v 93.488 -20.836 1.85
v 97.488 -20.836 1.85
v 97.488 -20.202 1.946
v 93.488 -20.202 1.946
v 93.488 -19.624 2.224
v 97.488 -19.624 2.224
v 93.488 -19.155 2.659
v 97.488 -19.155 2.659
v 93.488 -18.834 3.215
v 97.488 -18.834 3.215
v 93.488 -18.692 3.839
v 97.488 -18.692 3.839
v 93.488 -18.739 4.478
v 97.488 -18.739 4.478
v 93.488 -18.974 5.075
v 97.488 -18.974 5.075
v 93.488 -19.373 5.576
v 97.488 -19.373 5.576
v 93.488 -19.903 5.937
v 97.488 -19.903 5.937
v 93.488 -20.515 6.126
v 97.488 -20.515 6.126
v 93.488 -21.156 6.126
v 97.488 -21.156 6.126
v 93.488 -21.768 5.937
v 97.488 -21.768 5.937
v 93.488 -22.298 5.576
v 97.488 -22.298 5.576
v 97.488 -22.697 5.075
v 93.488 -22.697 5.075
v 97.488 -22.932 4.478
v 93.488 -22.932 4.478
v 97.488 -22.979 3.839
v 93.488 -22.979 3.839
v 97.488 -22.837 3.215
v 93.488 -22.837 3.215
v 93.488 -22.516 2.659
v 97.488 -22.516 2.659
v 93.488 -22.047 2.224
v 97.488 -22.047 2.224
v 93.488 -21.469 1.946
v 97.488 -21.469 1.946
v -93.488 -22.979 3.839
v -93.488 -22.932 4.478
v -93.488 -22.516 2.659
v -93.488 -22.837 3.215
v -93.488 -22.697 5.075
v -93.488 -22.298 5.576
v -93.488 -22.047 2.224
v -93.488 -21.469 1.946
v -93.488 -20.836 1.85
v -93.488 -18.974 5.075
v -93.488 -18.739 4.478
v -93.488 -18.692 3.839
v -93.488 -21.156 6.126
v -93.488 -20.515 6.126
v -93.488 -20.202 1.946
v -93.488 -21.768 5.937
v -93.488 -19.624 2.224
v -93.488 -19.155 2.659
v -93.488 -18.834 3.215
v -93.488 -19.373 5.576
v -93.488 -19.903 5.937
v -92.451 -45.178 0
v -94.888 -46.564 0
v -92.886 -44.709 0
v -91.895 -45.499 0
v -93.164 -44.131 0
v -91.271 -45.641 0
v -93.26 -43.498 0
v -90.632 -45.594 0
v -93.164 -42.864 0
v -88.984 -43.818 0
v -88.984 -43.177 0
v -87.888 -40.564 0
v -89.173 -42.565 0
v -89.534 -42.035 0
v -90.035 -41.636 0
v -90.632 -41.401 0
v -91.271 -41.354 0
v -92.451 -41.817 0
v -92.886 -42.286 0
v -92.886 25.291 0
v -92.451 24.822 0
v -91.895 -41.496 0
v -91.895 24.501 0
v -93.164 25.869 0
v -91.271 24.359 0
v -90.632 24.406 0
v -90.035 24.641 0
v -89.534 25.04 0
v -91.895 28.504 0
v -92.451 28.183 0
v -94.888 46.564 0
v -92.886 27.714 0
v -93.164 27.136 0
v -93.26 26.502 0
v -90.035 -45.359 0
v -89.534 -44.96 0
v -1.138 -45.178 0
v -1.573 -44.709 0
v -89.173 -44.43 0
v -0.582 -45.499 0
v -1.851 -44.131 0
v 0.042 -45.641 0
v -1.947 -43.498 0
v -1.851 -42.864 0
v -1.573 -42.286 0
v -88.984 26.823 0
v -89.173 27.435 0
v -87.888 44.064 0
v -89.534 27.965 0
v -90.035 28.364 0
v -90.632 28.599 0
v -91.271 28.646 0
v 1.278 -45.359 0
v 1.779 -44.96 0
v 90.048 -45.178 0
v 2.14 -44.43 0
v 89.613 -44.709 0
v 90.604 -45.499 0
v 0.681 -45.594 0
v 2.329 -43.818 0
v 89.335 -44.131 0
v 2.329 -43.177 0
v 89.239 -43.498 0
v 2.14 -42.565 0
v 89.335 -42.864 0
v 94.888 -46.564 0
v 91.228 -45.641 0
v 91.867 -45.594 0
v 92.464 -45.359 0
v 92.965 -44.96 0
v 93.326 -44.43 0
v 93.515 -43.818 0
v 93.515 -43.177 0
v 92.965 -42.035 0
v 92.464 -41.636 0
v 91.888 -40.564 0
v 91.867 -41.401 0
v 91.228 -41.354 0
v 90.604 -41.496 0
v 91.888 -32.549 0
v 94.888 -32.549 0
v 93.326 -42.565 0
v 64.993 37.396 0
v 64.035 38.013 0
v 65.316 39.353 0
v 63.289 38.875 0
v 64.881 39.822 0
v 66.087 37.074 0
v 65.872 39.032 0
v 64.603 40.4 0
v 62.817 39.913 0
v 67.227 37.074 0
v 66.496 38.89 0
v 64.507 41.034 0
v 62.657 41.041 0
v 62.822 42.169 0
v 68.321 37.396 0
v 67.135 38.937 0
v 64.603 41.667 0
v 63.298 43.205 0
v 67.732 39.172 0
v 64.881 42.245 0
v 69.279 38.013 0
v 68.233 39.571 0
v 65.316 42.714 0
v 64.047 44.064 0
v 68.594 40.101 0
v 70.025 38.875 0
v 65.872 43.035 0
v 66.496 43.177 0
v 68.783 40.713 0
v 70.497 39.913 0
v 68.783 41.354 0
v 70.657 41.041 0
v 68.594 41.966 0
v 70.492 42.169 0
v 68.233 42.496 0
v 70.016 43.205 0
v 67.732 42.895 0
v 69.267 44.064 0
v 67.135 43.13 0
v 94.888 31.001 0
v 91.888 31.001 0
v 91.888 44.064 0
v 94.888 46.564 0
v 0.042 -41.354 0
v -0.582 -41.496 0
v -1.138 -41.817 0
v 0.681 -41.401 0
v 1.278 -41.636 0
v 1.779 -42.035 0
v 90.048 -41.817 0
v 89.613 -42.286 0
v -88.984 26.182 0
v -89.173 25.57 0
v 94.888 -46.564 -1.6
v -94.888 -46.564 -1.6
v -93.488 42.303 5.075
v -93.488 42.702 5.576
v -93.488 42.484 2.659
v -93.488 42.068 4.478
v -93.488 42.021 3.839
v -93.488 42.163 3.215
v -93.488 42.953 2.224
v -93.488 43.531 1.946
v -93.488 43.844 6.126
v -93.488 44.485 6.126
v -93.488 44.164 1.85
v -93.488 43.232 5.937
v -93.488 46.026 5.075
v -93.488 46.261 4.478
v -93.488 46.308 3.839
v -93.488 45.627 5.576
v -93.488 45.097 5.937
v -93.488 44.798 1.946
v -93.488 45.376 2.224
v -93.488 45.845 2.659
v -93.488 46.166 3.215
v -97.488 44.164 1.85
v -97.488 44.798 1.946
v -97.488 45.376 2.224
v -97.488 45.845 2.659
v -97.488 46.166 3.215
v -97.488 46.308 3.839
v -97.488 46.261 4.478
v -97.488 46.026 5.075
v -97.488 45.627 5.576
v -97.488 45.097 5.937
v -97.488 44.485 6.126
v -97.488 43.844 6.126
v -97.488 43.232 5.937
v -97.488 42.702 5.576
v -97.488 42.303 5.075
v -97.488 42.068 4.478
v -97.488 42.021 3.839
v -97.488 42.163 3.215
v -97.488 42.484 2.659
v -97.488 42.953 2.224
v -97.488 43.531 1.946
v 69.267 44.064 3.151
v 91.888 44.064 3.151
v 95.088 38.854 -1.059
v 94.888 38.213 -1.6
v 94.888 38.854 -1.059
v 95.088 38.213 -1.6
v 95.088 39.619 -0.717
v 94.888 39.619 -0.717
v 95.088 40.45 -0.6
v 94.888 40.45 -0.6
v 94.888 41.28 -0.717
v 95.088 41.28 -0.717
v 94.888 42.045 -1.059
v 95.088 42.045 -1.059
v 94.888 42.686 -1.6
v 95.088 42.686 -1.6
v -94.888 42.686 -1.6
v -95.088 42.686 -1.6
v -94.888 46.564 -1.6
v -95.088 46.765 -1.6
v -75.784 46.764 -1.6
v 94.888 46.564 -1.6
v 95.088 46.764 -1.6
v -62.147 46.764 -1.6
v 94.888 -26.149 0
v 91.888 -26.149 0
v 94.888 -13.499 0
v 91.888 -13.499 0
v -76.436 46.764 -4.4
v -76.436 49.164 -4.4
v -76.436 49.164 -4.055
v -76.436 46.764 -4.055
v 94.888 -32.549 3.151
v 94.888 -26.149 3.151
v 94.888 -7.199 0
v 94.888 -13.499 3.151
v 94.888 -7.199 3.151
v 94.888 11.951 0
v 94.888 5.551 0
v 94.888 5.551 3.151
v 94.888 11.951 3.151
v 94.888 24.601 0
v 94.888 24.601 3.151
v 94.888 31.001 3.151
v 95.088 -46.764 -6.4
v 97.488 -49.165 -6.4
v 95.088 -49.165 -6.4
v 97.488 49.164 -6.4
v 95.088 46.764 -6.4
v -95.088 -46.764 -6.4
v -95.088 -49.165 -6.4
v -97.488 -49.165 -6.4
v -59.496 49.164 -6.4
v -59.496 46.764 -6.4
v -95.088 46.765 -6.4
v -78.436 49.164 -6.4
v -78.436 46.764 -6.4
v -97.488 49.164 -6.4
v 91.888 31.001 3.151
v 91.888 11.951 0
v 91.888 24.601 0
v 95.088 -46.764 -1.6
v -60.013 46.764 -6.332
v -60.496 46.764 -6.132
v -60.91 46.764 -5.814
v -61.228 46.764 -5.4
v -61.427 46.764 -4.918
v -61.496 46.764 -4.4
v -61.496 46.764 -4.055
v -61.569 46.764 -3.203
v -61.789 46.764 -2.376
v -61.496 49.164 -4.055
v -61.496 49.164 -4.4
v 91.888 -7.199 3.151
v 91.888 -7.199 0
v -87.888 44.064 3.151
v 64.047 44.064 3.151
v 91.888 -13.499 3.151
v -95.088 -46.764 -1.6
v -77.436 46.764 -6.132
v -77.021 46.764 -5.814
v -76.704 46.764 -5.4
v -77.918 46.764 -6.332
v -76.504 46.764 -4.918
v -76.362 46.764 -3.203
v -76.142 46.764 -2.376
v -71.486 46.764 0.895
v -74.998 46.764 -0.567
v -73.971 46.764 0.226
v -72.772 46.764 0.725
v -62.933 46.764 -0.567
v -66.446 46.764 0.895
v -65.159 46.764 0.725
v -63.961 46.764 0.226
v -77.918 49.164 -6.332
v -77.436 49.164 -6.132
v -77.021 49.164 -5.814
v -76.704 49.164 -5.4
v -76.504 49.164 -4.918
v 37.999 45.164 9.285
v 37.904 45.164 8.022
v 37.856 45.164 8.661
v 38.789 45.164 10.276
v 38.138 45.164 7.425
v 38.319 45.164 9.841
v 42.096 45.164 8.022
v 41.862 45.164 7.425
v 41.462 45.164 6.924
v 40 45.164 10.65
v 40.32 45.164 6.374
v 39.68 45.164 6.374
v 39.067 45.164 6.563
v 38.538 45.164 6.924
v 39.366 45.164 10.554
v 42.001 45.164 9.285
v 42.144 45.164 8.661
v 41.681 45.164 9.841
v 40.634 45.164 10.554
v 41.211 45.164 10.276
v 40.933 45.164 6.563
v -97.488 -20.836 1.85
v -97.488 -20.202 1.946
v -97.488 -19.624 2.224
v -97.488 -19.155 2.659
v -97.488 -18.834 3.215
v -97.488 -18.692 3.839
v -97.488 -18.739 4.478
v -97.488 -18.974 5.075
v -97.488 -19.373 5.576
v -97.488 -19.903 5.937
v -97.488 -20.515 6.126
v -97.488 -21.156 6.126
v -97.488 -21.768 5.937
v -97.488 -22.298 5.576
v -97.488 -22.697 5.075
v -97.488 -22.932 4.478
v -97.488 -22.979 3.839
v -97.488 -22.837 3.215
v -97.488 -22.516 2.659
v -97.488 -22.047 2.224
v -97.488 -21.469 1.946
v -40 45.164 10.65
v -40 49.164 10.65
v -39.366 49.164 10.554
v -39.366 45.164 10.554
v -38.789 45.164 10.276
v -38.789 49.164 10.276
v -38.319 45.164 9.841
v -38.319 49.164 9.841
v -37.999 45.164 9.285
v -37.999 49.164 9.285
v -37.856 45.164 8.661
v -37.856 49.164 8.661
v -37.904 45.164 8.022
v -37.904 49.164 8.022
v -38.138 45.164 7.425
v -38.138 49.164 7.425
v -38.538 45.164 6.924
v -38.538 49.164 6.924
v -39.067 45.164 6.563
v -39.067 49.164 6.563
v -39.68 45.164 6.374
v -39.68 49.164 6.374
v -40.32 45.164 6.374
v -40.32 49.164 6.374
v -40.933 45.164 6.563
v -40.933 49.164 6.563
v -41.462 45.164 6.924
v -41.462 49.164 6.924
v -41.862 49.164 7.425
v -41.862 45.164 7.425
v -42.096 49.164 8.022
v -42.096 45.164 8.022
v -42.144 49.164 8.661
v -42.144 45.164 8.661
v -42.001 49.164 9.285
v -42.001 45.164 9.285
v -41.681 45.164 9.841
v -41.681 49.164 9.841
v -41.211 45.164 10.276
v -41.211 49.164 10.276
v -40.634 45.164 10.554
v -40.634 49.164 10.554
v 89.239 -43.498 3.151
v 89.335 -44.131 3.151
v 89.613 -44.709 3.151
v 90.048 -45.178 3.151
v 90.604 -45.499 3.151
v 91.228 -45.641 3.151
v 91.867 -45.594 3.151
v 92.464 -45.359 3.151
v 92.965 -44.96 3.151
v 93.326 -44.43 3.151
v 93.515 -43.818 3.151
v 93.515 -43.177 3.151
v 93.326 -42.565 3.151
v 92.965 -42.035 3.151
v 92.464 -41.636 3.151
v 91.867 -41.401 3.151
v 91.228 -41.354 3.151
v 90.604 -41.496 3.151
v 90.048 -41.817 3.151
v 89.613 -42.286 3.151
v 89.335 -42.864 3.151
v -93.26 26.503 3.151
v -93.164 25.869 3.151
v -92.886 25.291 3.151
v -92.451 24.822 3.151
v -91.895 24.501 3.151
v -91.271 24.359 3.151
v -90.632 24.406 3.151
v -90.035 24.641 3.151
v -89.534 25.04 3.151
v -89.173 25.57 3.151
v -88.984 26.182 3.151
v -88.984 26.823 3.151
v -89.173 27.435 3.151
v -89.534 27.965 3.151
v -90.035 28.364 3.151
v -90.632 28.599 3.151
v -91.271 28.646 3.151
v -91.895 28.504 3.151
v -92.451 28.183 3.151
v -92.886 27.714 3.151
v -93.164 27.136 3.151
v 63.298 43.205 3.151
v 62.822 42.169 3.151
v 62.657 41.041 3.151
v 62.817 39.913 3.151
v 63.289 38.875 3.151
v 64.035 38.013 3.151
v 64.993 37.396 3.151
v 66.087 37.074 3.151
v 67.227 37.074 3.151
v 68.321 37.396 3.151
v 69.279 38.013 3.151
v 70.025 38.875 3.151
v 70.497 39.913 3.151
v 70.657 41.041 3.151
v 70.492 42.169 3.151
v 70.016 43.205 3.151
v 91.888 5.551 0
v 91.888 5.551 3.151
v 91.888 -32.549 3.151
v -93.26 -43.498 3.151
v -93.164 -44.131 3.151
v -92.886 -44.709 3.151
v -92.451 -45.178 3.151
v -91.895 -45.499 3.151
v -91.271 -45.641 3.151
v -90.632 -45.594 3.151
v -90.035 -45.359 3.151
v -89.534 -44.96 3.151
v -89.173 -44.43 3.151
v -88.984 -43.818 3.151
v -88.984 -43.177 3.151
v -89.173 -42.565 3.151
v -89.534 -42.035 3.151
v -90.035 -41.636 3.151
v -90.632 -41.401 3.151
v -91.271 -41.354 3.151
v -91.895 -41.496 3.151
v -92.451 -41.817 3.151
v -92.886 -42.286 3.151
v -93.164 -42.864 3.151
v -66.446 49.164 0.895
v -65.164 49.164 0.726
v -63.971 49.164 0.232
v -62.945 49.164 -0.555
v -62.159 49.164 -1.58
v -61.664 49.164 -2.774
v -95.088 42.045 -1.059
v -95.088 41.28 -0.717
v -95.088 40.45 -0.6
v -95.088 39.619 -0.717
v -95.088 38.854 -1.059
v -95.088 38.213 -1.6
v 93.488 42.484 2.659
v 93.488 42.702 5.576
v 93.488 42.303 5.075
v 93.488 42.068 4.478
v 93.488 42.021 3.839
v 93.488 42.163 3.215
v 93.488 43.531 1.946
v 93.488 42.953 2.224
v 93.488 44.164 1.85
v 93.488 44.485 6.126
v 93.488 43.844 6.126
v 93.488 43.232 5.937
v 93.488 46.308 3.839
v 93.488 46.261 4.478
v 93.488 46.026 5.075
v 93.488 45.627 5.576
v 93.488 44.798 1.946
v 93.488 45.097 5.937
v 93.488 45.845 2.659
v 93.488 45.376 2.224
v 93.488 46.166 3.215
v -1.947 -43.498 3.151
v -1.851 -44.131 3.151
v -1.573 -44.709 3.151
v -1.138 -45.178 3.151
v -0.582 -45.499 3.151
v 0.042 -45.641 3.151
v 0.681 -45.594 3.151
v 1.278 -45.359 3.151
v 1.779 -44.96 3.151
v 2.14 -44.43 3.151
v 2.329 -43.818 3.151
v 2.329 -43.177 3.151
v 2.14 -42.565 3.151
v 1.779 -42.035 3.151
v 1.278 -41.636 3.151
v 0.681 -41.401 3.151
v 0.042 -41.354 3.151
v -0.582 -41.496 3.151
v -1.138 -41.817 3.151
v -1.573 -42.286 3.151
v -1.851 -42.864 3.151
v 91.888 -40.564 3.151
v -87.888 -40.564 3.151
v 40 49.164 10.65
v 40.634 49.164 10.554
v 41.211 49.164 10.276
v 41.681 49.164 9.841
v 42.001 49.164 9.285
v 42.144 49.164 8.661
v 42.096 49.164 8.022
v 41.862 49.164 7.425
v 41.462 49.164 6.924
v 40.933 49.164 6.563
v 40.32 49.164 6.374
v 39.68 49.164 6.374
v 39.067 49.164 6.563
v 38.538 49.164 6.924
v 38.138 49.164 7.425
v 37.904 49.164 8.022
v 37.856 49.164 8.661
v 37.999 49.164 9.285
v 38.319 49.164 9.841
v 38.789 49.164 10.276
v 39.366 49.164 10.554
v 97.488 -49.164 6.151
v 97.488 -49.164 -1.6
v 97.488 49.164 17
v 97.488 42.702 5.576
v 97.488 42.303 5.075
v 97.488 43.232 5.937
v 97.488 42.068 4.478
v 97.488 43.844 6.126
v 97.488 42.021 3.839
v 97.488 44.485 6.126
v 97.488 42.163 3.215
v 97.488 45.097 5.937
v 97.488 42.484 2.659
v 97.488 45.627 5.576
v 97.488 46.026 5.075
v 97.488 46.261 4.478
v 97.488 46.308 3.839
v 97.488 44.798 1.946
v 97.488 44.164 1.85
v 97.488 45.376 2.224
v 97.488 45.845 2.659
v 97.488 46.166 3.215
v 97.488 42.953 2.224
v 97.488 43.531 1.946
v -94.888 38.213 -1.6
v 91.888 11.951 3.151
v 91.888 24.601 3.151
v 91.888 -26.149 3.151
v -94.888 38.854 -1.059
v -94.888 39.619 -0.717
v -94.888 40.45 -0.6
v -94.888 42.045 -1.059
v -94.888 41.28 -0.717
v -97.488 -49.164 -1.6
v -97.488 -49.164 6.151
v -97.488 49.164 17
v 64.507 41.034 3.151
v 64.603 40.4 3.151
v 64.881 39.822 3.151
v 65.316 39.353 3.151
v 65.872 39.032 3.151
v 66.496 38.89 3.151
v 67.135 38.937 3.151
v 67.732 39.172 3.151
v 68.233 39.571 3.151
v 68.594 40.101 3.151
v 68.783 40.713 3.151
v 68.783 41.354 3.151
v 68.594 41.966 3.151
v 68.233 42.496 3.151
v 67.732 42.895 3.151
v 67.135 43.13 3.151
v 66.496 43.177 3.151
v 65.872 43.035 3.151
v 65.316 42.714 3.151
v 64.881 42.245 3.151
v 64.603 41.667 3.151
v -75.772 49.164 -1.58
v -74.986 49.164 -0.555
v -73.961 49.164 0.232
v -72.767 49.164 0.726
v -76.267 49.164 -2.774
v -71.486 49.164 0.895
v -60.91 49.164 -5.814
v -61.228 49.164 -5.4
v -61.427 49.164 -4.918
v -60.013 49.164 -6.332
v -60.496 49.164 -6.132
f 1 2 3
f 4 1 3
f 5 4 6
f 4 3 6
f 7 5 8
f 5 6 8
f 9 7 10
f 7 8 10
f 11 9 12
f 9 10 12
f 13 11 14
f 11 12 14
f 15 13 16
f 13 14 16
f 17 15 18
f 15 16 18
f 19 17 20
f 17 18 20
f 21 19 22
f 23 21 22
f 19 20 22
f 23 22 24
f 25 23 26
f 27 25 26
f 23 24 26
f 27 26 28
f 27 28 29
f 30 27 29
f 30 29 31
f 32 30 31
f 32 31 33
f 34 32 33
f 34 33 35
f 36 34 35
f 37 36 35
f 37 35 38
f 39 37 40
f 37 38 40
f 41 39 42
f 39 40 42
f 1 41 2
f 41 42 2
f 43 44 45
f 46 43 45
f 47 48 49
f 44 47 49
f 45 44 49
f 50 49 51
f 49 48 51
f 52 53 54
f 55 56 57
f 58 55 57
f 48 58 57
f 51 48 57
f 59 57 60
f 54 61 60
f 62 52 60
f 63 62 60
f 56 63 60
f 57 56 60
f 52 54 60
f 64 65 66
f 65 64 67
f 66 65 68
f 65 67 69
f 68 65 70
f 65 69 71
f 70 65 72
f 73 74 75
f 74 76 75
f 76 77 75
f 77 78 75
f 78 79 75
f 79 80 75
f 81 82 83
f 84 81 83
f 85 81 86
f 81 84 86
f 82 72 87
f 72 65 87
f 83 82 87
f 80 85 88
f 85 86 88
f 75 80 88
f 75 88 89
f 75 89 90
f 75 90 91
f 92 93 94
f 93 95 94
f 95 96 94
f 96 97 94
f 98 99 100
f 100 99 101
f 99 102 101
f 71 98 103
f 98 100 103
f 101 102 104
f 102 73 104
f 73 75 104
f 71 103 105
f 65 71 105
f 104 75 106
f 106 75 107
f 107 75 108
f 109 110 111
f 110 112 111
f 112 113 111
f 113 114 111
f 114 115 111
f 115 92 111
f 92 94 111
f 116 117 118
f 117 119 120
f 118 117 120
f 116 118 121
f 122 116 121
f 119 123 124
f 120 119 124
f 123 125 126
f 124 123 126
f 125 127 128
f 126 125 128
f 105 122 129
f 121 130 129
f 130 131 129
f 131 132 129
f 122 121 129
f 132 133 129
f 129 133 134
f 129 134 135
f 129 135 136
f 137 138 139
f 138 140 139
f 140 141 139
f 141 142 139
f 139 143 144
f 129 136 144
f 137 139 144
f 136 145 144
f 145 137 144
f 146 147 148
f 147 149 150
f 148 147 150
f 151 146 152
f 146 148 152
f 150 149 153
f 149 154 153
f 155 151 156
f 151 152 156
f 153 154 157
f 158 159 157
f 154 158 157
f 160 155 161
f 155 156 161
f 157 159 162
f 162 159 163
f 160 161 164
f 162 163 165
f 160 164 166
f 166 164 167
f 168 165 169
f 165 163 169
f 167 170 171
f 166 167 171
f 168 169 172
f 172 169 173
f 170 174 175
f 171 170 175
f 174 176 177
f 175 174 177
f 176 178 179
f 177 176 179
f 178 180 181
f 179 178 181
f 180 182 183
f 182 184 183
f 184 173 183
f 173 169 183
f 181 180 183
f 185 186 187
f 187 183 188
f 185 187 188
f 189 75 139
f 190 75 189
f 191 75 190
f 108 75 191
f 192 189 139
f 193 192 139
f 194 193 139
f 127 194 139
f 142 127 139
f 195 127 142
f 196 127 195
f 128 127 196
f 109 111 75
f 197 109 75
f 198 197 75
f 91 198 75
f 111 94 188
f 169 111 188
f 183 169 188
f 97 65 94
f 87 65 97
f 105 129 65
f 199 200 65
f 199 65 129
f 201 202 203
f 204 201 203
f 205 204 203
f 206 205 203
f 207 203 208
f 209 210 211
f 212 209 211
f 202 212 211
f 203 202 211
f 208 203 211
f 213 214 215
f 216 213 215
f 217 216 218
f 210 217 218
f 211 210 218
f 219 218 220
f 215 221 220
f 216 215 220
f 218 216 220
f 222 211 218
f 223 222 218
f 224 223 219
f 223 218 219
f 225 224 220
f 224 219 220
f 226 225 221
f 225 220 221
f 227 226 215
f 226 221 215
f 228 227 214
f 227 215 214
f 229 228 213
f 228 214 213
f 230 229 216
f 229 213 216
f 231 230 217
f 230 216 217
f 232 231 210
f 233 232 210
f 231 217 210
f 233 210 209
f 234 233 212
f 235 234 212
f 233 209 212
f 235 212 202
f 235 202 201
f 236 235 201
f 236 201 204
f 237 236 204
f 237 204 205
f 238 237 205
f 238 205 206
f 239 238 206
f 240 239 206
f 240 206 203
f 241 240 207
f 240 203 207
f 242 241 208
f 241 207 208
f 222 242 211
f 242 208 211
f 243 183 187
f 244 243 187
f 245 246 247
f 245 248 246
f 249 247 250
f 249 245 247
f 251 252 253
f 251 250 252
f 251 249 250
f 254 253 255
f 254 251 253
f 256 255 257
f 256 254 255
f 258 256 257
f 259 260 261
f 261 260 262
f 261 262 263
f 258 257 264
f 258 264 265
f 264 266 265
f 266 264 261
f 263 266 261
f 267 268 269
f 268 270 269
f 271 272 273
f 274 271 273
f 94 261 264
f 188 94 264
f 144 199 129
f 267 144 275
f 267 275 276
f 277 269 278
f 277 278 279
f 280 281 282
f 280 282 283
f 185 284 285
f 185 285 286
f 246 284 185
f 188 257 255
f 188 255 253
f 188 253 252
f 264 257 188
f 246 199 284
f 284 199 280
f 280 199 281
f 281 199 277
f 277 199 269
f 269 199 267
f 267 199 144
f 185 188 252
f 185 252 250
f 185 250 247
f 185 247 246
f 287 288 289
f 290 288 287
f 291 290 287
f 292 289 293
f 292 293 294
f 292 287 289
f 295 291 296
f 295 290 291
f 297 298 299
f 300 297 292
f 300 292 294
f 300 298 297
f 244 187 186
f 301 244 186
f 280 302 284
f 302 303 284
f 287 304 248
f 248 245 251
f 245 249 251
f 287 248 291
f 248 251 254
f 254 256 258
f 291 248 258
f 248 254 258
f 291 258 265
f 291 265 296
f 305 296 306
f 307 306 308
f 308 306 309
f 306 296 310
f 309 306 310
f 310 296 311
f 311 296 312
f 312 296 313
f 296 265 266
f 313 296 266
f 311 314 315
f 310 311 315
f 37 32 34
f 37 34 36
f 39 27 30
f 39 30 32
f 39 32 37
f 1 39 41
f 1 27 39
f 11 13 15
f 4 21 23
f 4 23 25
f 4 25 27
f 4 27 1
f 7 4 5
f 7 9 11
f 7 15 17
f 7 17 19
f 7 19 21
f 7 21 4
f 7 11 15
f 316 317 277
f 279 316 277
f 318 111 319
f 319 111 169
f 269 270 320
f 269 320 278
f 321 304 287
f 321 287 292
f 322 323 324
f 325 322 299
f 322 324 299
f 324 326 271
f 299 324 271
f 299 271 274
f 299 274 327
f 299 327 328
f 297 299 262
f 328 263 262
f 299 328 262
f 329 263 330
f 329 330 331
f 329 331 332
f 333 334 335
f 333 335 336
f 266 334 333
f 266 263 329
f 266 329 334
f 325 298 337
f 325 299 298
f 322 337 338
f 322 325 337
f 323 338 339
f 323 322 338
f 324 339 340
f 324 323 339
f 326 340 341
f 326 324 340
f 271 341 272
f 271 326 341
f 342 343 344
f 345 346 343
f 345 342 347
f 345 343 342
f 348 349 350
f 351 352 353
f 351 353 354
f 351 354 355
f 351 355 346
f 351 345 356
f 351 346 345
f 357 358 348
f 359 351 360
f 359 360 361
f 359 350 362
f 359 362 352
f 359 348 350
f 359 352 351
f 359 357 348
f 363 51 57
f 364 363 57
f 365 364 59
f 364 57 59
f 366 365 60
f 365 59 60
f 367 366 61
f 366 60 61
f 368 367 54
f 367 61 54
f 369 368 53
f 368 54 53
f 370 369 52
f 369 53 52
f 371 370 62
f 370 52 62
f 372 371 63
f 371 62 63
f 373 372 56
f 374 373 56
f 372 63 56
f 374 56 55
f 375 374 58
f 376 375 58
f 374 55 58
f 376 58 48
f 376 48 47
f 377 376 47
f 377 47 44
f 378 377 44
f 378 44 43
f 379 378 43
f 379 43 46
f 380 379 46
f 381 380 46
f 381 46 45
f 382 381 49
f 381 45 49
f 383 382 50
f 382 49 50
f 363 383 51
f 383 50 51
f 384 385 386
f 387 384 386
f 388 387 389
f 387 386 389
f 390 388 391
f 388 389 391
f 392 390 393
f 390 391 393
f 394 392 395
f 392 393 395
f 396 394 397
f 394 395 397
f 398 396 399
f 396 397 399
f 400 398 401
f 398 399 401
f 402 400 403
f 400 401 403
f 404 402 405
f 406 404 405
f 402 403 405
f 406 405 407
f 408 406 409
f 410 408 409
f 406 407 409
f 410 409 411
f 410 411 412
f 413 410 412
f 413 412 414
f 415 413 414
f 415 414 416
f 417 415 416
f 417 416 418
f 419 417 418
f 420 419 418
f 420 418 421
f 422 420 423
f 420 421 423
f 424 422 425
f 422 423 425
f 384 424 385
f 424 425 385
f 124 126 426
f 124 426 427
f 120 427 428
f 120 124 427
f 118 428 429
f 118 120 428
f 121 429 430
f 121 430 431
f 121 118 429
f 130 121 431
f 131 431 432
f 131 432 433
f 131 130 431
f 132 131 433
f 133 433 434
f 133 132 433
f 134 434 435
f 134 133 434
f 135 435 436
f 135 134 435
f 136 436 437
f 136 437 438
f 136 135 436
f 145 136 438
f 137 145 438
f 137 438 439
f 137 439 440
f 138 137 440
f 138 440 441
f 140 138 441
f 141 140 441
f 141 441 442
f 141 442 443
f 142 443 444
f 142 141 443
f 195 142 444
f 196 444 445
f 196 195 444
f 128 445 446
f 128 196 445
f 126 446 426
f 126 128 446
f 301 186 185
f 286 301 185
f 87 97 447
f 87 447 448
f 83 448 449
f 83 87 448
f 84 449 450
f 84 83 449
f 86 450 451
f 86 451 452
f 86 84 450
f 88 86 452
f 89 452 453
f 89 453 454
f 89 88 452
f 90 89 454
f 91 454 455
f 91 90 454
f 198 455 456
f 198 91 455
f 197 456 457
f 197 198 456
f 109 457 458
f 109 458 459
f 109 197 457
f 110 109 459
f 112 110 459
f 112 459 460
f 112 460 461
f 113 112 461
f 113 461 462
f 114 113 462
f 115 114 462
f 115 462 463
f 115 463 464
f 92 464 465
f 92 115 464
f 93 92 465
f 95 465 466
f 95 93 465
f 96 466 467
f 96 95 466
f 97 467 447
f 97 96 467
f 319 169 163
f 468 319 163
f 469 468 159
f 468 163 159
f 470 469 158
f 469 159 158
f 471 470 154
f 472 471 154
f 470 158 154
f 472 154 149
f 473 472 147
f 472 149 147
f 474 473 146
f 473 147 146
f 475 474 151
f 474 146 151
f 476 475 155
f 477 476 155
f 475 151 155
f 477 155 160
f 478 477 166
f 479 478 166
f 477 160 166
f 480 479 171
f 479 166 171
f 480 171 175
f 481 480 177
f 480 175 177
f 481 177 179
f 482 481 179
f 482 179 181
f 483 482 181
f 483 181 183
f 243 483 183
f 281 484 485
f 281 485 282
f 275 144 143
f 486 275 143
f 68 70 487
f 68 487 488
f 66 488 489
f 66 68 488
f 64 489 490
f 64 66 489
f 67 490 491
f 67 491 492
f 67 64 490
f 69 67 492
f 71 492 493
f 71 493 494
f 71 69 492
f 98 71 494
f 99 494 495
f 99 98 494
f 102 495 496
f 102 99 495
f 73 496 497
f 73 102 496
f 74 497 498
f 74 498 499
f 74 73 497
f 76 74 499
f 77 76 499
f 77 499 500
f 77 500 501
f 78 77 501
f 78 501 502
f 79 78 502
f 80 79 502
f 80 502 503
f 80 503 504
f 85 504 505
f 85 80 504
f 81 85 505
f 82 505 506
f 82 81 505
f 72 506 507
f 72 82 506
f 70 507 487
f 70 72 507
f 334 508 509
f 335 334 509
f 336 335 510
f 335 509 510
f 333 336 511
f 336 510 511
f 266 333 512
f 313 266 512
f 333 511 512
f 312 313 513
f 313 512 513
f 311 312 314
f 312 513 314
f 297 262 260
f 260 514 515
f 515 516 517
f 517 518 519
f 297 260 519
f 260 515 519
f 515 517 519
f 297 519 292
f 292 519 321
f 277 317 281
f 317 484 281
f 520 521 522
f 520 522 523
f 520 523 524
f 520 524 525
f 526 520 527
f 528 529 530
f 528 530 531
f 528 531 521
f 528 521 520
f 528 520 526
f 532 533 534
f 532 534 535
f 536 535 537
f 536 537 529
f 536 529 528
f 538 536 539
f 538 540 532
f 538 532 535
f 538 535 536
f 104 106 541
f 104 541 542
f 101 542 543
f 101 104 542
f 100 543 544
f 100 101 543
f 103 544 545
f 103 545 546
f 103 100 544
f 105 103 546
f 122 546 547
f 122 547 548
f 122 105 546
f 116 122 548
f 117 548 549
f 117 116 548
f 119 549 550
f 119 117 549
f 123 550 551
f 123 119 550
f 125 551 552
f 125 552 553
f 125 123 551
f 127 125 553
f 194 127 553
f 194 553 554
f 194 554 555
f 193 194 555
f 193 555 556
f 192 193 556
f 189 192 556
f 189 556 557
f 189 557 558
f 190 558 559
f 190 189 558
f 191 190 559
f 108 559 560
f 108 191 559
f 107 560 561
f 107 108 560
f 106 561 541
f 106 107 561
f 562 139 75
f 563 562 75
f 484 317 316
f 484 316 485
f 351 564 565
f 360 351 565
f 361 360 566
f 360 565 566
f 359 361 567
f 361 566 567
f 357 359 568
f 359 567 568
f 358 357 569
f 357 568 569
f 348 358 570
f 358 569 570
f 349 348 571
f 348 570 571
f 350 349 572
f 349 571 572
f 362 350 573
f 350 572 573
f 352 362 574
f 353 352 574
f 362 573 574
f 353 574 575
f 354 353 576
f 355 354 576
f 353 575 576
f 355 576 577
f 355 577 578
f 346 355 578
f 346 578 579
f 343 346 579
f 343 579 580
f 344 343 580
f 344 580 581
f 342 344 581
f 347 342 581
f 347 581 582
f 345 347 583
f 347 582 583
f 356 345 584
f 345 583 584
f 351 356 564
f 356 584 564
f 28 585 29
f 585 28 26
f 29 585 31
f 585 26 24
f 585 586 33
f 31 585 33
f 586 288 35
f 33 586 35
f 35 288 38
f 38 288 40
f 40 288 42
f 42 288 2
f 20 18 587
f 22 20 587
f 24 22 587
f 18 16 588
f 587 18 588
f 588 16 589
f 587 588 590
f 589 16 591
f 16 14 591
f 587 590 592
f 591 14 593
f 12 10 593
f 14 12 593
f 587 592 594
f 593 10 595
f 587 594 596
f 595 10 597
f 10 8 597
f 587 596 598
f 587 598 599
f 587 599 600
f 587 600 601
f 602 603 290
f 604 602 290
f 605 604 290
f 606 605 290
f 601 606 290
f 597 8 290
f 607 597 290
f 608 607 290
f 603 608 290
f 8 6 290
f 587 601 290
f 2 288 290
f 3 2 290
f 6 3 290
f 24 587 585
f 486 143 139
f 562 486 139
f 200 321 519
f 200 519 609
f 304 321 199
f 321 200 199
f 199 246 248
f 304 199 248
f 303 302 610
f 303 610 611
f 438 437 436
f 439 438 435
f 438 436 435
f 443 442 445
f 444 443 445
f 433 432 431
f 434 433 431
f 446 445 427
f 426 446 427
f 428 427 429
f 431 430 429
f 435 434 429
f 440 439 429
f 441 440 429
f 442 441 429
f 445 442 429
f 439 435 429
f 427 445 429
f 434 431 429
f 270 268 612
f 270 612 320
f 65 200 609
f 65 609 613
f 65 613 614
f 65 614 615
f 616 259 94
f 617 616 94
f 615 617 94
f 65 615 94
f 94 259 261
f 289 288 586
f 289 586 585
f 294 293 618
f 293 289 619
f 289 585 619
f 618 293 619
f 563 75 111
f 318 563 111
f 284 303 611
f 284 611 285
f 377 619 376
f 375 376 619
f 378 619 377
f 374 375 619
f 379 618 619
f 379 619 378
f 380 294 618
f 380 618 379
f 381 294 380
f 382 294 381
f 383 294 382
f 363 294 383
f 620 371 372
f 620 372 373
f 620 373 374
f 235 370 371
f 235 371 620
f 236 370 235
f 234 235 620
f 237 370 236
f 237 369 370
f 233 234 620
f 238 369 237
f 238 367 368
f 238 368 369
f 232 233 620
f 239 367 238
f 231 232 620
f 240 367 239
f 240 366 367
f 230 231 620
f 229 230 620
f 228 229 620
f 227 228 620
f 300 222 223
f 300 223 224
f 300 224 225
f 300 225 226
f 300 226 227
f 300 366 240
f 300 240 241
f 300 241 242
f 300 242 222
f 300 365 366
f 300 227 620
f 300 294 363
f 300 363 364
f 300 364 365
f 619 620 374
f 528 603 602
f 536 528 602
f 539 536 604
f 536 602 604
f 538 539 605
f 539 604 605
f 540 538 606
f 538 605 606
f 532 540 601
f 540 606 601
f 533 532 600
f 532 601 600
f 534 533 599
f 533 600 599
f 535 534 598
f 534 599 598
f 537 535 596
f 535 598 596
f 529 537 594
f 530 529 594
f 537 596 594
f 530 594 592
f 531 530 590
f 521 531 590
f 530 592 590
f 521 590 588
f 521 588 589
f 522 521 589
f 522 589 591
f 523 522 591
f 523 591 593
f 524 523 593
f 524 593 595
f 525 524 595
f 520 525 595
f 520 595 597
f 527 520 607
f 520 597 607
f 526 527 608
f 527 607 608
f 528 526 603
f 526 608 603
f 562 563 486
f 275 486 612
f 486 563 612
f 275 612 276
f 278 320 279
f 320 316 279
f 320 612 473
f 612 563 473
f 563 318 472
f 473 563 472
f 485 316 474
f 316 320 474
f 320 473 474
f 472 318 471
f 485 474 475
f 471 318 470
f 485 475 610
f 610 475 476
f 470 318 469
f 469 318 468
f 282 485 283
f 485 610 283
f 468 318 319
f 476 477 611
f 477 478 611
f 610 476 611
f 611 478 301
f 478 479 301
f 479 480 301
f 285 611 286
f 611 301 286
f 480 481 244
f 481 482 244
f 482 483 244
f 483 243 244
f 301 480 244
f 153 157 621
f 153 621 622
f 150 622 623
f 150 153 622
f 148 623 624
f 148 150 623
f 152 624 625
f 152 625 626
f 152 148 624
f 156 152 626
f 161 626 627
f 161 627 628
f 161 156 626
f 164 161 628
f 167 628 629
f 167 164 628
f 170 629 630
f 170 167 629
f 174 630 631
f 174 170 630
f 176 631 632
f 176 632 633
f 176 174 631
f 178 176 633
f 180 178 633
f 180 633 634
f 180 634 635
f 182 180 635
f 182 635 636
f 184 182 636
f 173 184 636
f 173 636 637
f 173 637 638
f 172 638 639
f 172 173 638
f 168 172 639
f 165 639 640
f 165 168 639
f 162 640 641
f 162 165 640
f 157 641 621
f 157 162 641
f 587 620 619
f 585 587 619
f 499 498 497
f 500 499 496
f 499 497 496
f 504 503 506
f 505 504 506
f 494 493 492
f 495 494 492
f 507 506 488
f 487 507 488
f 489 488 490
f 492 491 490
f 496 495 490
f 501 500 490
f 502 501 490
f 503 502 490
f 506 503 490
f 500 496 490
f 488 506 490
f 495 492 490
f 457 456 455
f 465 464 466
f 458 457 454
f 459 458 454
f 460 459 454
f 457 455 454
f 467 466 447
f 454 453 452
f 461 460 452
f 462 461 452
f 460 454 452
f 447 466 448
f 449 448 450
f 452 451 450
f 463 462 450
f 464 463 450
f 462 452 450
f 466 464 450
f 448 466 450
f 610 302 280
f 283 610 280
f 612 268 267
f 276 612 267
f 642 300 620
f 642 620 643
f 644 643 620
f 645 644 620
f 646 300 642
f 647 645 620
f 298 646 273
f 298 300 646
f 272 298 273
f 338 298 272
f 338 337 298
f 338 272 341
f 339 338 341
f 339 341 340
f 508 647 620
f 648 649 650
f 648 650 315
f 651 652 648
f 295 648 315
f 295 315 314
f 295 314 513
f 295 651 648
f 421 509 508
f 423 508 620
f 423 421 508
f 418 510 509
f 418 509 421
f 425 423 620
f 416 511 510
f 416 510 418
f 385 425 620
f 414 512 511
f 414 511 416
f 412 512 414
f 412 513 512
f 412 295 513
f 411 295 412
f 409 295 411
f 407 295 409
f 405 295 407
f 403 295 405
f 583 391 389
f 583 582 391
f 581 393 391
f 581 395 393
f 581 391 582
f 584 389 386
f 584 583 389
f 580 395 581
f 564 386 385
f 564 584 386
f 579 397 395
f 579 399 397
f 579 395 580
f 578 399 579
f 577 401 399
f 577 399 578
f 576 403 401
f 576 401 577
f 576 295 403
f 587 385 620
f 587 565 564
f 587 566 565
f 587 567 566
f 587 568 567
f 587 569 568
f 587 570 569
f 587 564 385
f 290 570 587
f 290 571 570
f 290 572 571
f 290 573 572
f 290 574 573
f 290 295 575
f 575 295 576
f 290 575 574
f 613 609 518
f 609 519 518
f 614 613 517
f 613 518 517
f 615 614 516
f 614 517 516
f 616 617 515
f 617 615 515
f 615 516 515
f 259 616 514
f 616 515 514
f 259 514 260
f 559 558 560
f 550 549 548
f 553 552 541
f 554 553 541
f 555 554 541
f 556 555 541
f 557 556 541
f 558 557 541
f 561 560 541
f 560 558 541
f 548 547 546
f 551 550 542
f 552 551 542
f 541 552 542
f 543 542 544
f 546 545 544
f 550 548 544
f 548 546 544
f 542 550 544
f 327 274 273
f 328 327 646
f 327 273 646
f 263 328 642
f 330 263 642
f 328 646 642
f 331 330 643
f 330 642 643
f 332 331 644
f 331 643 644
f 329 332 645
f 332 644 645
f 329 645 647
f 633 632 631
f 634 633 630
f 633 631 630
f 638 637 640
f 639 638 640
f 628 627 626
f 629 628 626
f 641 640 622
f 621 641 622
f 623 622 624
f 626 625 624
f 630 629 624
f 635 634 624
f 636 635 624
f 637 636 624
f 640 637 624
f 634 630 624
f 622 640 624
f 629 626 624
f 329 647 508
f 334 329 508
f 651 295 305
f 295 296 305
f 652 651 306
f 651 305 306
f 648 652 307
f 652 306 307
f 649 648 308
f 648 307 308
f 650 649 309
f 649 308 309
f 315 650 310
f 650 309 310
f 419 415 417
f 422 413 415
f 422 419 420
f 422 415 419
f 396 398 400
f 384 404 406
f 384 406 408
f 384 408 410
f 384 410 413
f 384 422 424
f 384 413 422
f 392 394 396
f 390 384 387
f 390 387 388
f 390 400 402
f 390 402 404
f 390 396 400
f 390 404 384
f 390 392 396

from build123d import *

# Parameters (mm, degrees)
SKETCH1_R           = 2.15
SKETCH1_W           = 3
SKETCH1_H           = 12.65
SKETCH1_H_2         = 12.75
BOSS_EXTRUDE1_DEPTH = 3.15085709
BOSS_EXTRUDE2_START = 3.150857
SKETCH1_3_R         = 2.15
SKETCH1_3_W         = 3
SKETCH1_3_H         = 6.4
SKETCH1_3_H_2       = 12.65
SKETCH1_3_H_3       = 12.75
SKETCH1_3_H_4       = 6.3
BOSS_EXTRUDE2_DEPTH = 3
SKETCH1_4_W         = 194.976
SKETCH1_4_H         = 98.329
SKETCH1_4_W_2       = 189.776
SKETCH1_4_H_2       = 93.129
BOSS_EXTRUDE4_DEPTH = 6.15085709
BOSS_EXTRUDE5_DEPTH = 194.976
SKETCH5_R           = 2.15
CUT_EXTRUDE2_DEPTH  = 4
SKETCH6_R           = 2.15
CUT_EXTRUDE3_DEPTH  = 4
CUT_EXTRUDE4_START  = -190.976
SKETCH6_2_R         = 2.15
CUT_EXTRUDE4_DEPTH  = 4
BOSS_EXTRUDE6_START = -1.6
SKETCH1_5_W         = 194.976
SKETCH1_5_H         = 98.329
SKETCH1_5_W_2       = 189.776
SKETCH1_5_H_2       = 93.129
BOSS_EXTRUDE6_DEPTH = 1.6
SKETCH7_R           = 3
CUT_EXTRUDE5_DEPTH  = 2.6
CUT_EXTRUDE6_START  = -194.976
SKETCH7_2_R         = 3
CUT_EXTRUDE6_DEPTH  = 2.6
BOSS_EXTRUDE7_START = -1
SKETCH9_W           = 2.4
SKETCH9_H           = 87.377932023
SKETCH9_H_2         = 4.078932023
SKETCH9_W_2         = 190.176
SKETCH9_H_3         = 2.4
SKETCH9_H_4         = 4.472135954
BOSS_EXTRUDE7_DEPTH = 5.8
CUT_EXTRUDE7_DEPTH  = 2.4
FILLET1_R           = 2


with BuildPart() as part:
    # Sketch1 → Boss-Extrude1 (new body)
    # profile 1 of 5: a face of its own
    with BuildSketch(Plane.XY):
        Polygon((94.888, 46.5645), (-94.888, 46.5645), (-94.888, -46.5645), (94.888, -46.5645), (94.888, -32.548850543), (91.888, -32.548850543), (91.888, -40.5645), (-87.888, -40.5645), (-87.888, 44.0645), (64.046820121, 44.0645), (69.267179879, 44.0645), (91.888, 44.0645), (91.888, 31.001149457), (94.888, 31.001149457), align=None)
        with Locations(Location((-91.11, -43.4975, 0), (0, 0, 180))):
            Circle(SKETCH1_R, mode=Mode.SUBTRACT)
        with Locations(Location((0.203, -43.4975, 0), (0, 0, 180))):
            Circle(SKETCH1_R, mode=Mode.SUBTRACT)
        with Locations(Location((91.389, -43.4975, 0), (0, 0, 180))):
            Circle(SKETCH1_R, mode=Mode.SUBTRACT)
        with Locations(Location((-91.11, 26.5025, 0), (0, 0, 180))):
            Circle(SKETCH1_R, mode=Mode.SUBTRACT)
    # profile 2 of 5: a face of its own
    with BuildSketch(Plane.XY):
        with Locations((93.388, 18.276149457)):
            Rectangle(SKETCH1_W, SKETCH1_H)
    # profile 3 of 5: a face of its own
    with BuildSketch(Plane.XY):
        with Locations((93.388, -0.823850543)):
            Rectangle(SKETCH1_W, SKETCH1_H_2)
    # profile 4 of 5: a face of its own
    with BuildSketch(Plane.XY):
        with Locations((93.388, -19.823850543)):
            Rectangle(SKETCH1_W, SKETCH1_H)
    # profile 5 of 5: a face of its own
    with BuildSketch(Plane.XY):
        with BuildLine():
            ThreePointArc((64.046820121, 44.0645), (66.657, 37.0335), (69.267179879, 44.0645))
            Line((69.267179879, 44.0645), (64.046820121, 44.0645))
        make_face()
        with Locations(Location((66.657, 41.0335, 0), (0, 0, 180))):
            Circle(SKETCH1_R, mode=Mode.SUBTRACT)
    extrude(amount=BOSS_EXTRUDE1_DEPTH)

    # Sketch1<3> → Boss-Extrude2 (add)
    # profile 1 of 15: a face of its own
    with BuildSketch(Plane.XY.offset(BOSS_EXTRUDE2_START)):
        Polygon((94.888, 46.5645), (-94.888, 46.5645), (-94.888, -46.5645), (94.888, -46.5645), (94.888, -32.548850543), (91.888, -32.548850543), (91.888, -40.5645), (-87.888, -40.5645), (-87.888, 44.0645), (64.046820121, 44.0645), (69.267179879, 44.0645), (91.888, 44.0645), (91.888, 31.001149457), (94.888, 31.001149457), align=None)
        with Locations(Location((-91.11, -43.4975, 0), (0, 0, 180))):
            Circle(SKETCH1_3_R, mode=Mode.SUBTRACT)
        with Locations(Location((0.203, -43.4975, 0), (0, 0, 180))):
            Circle(SKETCH1_3_R, mode=Mode.SUBTRACT)
        with Locations(Location((91.389, -43.4975, 0), (0, 0, 180))):
            Circle(SKETCH1_3_R, mode=Mode.SUBTRACT)
        with Locations(Location((-91.11, 26.5025, 0), (0, 0, 180))):
            Circle(SKETCH1_3_R, mode=Mode.SUBTRACT)
    # profile 2 of 15: a face of its own
    with BuildSketch(Plane.XY.offset(BOSS_EXTRUDE2_START)):
        with Locations((93.388, 8.751149457)):
            Rectangle(SKETCH1_3_W, SKETCH1_3_H)
    # profile 3 of 15: a face of its own
    with BuildSketch(Plane.XY.offset(BOSS_EXTRUDE2_START)):
        with Locations((93.388, 18.276149457)):
            Rectangle(SKETCH1_3_W, SKETCH1_3_H_2)
    # profile 4 of 15: a face of its own
    with BuildSketch(Plane.XY.offset(BOSS_EXTRUDE2_START)):
        with BuildLine():
            Line((91.888, 24.601149457), (91.888, 31.001149457))
            Line((91.888, 31.001149457), (91.888, 44.0645))
            Line((91.888, 44.0645), (69.267179879, 44.0645))
            ThreePointArc((69.267179879, 44.0645), (66.657, 37.0335), (64.046820121, 44.0645))
            Line((64.046820121, 44.0645), (-87.888, 44.0645))
            Line((-87.888, 44.0645), (-87.888, -40.5645))
            Line((-87.888, -40.5645), (91.888, -40.5645))
            Line((91.888, -40.5645), (91.888, -32.548850543))
            Line((91.888, -32.548850543), (91.888, -26.148850543))
            Line((91.888, -26.148850543), (91.888, -13.498850543))
            Line((91.888, -13.498850543), (91.888, -7.198850543))
            Line((91.888, -7.198850543), (91.888, 5.551149457))
            Line((91.888, 5.551149457), (91.888, 11.951149457))
            Line((91.888, 11.951149457), (91.888, 24.601149457))
        make_face()
    # profile 5 of 15: a face of its own
    with BuildSketch(Plane.XY.offset(BOSS_EXTRUDE2_START)):
        with Locations((93.388, -0.823850543)):
            Rectangle(SKETCH1_3_W, SKETCH1_3_H_3)
    # profile 6 of 15: a face of its own
    with BuildSketch(Plane.XY.offset(BOSS_EXTRUDE2_START)):
        with Locations((93.388, -10.348850543)):
            Rectangle(SKETCH1_3_W, SKETCH1_3_H_4)
    # profile 7 of 15: a face of its own
    with BuildSketch(Plane.XY.offset(BOSS_EXTRUDE2_START)):
        with Locations((93.388, -19.823850543)):
            Rectangle(SKETCH1_3_W, SKETCH1_3_H_2)
    # profile 8 of 15: a face of its own
    with BuildSketch(Plane.XY.offset(BOSS_EXTRUDE2_START)):
        with Locations((93.388, -29.348850543)):
            Rectangle(SKETCH1_3_W, SKETCH1_3_H)
    # profile 9 of 15: a face of its own
    with BuildSketch(Plane.XY.offset(BOSS_EXTRUDE2_START)):
        with Locations((93.388, 27.801149457)):
            Rectangle(SKETCH1_3_W, SKETCH1_3_H)
    # profile 10 of 15: a face of its own
    with BuildSketch(Plane.XY.offset(BOSS_EXTRUDE2_START)):
        with BuildLine():
            ThreePointArc((64.046820121, 44.0645), (66.657, 37.0335), (69.267179879, 44.0645))
            Line((69.267179879, 44.0645), (64.046820121, 44.0645))
        make_face()
        with Locations(Location((66.657, 41.0335, 0), (0, 0, 180))):
            Circle(SKETCH1_3_R, mode=Mode.SUBTRACT)
    # profile 11 of 15: a face of its own
    with BuildSketch(Plane.XY.offset(BOSS_EXTRUDE2_START)):
        with Locations(Location((66.657, 41.0335, 0), (0, 0, 180))):
            Circle(SKETCH1_3_R)
    # profile 12 of 15: a face of its own
    with BuildSketch(Plane.XY.offset(BOSS_EXTRUDE2_START)):
        with Locations(Location((91.389, -43.4975, 0), (0, 0, 180))):
            Circle(SKETCH1_3_R)
    # profile 13 of 15: a face of its own
    with BuildSketch(Plane.XY.offset(BOSS_EXTRUDE2_START)):
        with Locations(Location((0.203, -43.4975, 0), (0, 0, 180))):
            Circle(SKETCH1_3_R)
    # profile 14 of 15: a face of its own
    with BuildSketch(Plane.XY.offset(BOSS_EXTRUDE2_START)):
        with Locations(Location((-91.11, -43.4975, 0), (0, 0, 180))):
            Circle(SKETCH1_3_R)
    # profile 15 of 15: a face of its own
    with BuildSketch(Plane.XY.offset(BOSS_EXTRUDE2_START)):
        with Locations(Location((-91.11, 26.5025, 0), (0, 0, 180))):
            Circle(SKETCH1_3_R)
    extrude(amount=BOSS_EXTRUDE2_DEPTH)

    # Sketch1<4> → Boss-Extrude4 (add)
    with BuildSketch(Plane.XY):
        Rectangle(SKETCH1_4_W, SKETCH1_4_H)
        Rectangle(SKETCH1_4_W_2, SKETCH1_4_H_2, mode=Mode.SUBTRACT)
    extrude(amount=BOSS_EXTRUDE4_DEPTH)

    # Sketch4 → Boss-Extrude5 (add)
    with BuildSketch(Plane.ZY.offset(97.488)):
        Polygon((6.15085709, 49.1645), (17, 49.1645), (6.15085709, -49.1645), align=None)
    extrude(amount=-BOSS_EXTRUDE5_DEPTH)

    # Sketch5 → Cut-Extrude2 (cut)
    with BuildSketch(Plane(origin=(0, 49.1645, 0), x_dir=(1, 0, 0), z_dir=(0, 1, 0))):
        with Locations(Location((-40, -8.5, 0), (0, 0, 270))):
            Circle(SKETCH5_R)
        with Locations(Location((40, -8.5, 0), (0, 0, 270))):
            Circle(SKETCH5_R)
    extrude(amount=-CUT_EXTRUDE2_DEPTH, mode=Mode.SUBTRACT)

    # Sketch6 → Cut-Extrude3 (cut)
    with BuildSketch(Plane(origin=(97.488, 0, 0), x_dir=(0, 0, -1), z_dir=(1, 0, 0))):
        with Locations((-4, 44.1645)):
            Circle(SKETCH6_R)
        with Locations((-4, -20.8355)):
            Circle(SKETCH6_R)
    extrude(amount=-CUT_EXTRUDE3_DEPTH, mode=Mode.SUBTRACT)

    # Sketch6<2> → Cut-Extrude4 (cut)
    with BuildSketch(Plane(origin=(97.488, 0, 0), x_dir=(0, 0, -1), z_dir=(1, 0, 0)).offset(CUT_EXTRUDE4_START)):
        with Locations((-4, 44.1645)):
            Circle(SKETCH6_2_R)
        with Locations((-4, -20.8355)):
            Circle(SKETCH6_2_R)
    extrude(amount=-CUT_EXTRUDE4_DEPTH, mode=Mode.SUBTRACT)

    # Sketch1<5> → Boss-Extrude6 (add)
    with BuildSketch(Plane.XY.offset(BOSS_EXTRUDE6_START)):
        Rectangle(SKETCH1_5_W, SKETCH1_5_H)
        Rectangle(SKETCH1_5_W_2, SKETCH1_5_H_2, mode=Mode.SUBTRACT)
    extrude(amount=BOSS_EXTRUDE6_DEPTH)

    # Sketch7 → Cut-Extrude5 (cut)
    with BuildSketch(Plane.ZY.offset(97.488)):
        with Locations((-3.6, 40.4495)):
            Circle(SKETCH7_R)
    extrude(amount=-CUT_EXTRUDE5_DEPTH, mode=Mode.SUBTRACT)

    # Sketch7<2> → Cut-Extrude6 (cut)
    with BuildSketch(Plane.ZY.offset(97.488).offset(CUT_EXTRUDE6_START)):
        with Locations((-3.6, 40.4495)):
            Circle(SKETCH7_2_R)
    extrude(amount=CUT_EXTRUDE6_DEPTH, mode=Mode.SUBTRACT)

    # Sketch9 → Boss-Extrude7 (add)
    with BuildSketch(Plane(origin=(0, 0, -1.6), x_dir=(-1, 0, 0), z_dir=(0, 0, -1)).offset(BOSS_EXTRUDE7_START)):
        Polygon((-97.488, 49.1645), (-97.488, 42.685567977), (-95.088, 42.685567977), (-95.088, 46.7645), (-95.088, 49.1645), align=None)
        Polygon((-95.088, 49.1645), (-95.088, 46.7645), (95.088, 46.7645), (97.488, 46.7645), (97.488, 49.1645), align=None)
        with Locations((-96.288, -5.475533989)):
            Rectangle(SKETCH9_W, SKETCH9_H)
        with Locations((96.288, 44.725033989)):
            Rectangle(SKETCH9_W, SKETCH9_H_2)
        with Locations((96.288, -5.475533989)):
            Rectangle(SKETCH9_W, SKETCH9_H)
        with Locations((0, -47.9645)):
            Rectangle(SKETCH9_W_2, SKETCH9_H_3)
        with Locations((-96.288, 40.4495)):
            Rectangle(SKETCH9_W, SKETCH9_H_4)
        with Locations((96.288, 40.4495)):
            Rectangle(SKETCH9_W, SKETCH9_H_4)
    extrude(amount=BOSS_EXTRUDE7_DEPTH)

    # Sketch10 → Cut-Extrude7 (cut)
    with BuildSketch(Plane(origin=(0, 49.1645, 0), x_dir=(1, 0, 0), z_dir=(0, 1, 0))):
        with BuildLine():
            Line((-66.44559, 9.005), (-71.48559, 9.005))
            ThreePointArc((-71.48559, 9.005), (-74.024758171, 8.304132264), (-75.844887535, 6.4))
            Line((-75.844887535, 6.4), (-76.43559, 6.4))
            Line((-76.43559, 6.4), (-76.43559, 4.055))
            ThreePointArc((-76.43559, 4.055), (-74.985768567, 0.554821433), (-71.48559, -0.895))
            Line((-71.48559, -0.895), (-66.44559, -0.895))
            ThreePointArc((-66.44559, -0.895), (-62.945411433, 0.554821433), (-61.49559, 4.055))
            Line((-61.49559, 4.055), (-61.49559, 6.4))
            Line((-61.49559, 6.4), (-62.086292465, 6.4))
            ThreePointArc((-62.086292465, 6.4), (-63.906421829, 8.304132264), (-66.44559, 9.005))
        make_face()
    extrude(amount=-CUT_EXTRUDE7_DEPTH, mode=Mode.SUBTRACT)

    # Fillet1
    fillet1_edges = [part.edges().sort_by_distance(p)[0] for p in [
        (-76.43559, 47.9645, -6.4),
        (-61.49559, 47.9645, -6.4),
    ]]
    fillet(fillet1_edges, radius=FILLET1_R)


solid = part.part
